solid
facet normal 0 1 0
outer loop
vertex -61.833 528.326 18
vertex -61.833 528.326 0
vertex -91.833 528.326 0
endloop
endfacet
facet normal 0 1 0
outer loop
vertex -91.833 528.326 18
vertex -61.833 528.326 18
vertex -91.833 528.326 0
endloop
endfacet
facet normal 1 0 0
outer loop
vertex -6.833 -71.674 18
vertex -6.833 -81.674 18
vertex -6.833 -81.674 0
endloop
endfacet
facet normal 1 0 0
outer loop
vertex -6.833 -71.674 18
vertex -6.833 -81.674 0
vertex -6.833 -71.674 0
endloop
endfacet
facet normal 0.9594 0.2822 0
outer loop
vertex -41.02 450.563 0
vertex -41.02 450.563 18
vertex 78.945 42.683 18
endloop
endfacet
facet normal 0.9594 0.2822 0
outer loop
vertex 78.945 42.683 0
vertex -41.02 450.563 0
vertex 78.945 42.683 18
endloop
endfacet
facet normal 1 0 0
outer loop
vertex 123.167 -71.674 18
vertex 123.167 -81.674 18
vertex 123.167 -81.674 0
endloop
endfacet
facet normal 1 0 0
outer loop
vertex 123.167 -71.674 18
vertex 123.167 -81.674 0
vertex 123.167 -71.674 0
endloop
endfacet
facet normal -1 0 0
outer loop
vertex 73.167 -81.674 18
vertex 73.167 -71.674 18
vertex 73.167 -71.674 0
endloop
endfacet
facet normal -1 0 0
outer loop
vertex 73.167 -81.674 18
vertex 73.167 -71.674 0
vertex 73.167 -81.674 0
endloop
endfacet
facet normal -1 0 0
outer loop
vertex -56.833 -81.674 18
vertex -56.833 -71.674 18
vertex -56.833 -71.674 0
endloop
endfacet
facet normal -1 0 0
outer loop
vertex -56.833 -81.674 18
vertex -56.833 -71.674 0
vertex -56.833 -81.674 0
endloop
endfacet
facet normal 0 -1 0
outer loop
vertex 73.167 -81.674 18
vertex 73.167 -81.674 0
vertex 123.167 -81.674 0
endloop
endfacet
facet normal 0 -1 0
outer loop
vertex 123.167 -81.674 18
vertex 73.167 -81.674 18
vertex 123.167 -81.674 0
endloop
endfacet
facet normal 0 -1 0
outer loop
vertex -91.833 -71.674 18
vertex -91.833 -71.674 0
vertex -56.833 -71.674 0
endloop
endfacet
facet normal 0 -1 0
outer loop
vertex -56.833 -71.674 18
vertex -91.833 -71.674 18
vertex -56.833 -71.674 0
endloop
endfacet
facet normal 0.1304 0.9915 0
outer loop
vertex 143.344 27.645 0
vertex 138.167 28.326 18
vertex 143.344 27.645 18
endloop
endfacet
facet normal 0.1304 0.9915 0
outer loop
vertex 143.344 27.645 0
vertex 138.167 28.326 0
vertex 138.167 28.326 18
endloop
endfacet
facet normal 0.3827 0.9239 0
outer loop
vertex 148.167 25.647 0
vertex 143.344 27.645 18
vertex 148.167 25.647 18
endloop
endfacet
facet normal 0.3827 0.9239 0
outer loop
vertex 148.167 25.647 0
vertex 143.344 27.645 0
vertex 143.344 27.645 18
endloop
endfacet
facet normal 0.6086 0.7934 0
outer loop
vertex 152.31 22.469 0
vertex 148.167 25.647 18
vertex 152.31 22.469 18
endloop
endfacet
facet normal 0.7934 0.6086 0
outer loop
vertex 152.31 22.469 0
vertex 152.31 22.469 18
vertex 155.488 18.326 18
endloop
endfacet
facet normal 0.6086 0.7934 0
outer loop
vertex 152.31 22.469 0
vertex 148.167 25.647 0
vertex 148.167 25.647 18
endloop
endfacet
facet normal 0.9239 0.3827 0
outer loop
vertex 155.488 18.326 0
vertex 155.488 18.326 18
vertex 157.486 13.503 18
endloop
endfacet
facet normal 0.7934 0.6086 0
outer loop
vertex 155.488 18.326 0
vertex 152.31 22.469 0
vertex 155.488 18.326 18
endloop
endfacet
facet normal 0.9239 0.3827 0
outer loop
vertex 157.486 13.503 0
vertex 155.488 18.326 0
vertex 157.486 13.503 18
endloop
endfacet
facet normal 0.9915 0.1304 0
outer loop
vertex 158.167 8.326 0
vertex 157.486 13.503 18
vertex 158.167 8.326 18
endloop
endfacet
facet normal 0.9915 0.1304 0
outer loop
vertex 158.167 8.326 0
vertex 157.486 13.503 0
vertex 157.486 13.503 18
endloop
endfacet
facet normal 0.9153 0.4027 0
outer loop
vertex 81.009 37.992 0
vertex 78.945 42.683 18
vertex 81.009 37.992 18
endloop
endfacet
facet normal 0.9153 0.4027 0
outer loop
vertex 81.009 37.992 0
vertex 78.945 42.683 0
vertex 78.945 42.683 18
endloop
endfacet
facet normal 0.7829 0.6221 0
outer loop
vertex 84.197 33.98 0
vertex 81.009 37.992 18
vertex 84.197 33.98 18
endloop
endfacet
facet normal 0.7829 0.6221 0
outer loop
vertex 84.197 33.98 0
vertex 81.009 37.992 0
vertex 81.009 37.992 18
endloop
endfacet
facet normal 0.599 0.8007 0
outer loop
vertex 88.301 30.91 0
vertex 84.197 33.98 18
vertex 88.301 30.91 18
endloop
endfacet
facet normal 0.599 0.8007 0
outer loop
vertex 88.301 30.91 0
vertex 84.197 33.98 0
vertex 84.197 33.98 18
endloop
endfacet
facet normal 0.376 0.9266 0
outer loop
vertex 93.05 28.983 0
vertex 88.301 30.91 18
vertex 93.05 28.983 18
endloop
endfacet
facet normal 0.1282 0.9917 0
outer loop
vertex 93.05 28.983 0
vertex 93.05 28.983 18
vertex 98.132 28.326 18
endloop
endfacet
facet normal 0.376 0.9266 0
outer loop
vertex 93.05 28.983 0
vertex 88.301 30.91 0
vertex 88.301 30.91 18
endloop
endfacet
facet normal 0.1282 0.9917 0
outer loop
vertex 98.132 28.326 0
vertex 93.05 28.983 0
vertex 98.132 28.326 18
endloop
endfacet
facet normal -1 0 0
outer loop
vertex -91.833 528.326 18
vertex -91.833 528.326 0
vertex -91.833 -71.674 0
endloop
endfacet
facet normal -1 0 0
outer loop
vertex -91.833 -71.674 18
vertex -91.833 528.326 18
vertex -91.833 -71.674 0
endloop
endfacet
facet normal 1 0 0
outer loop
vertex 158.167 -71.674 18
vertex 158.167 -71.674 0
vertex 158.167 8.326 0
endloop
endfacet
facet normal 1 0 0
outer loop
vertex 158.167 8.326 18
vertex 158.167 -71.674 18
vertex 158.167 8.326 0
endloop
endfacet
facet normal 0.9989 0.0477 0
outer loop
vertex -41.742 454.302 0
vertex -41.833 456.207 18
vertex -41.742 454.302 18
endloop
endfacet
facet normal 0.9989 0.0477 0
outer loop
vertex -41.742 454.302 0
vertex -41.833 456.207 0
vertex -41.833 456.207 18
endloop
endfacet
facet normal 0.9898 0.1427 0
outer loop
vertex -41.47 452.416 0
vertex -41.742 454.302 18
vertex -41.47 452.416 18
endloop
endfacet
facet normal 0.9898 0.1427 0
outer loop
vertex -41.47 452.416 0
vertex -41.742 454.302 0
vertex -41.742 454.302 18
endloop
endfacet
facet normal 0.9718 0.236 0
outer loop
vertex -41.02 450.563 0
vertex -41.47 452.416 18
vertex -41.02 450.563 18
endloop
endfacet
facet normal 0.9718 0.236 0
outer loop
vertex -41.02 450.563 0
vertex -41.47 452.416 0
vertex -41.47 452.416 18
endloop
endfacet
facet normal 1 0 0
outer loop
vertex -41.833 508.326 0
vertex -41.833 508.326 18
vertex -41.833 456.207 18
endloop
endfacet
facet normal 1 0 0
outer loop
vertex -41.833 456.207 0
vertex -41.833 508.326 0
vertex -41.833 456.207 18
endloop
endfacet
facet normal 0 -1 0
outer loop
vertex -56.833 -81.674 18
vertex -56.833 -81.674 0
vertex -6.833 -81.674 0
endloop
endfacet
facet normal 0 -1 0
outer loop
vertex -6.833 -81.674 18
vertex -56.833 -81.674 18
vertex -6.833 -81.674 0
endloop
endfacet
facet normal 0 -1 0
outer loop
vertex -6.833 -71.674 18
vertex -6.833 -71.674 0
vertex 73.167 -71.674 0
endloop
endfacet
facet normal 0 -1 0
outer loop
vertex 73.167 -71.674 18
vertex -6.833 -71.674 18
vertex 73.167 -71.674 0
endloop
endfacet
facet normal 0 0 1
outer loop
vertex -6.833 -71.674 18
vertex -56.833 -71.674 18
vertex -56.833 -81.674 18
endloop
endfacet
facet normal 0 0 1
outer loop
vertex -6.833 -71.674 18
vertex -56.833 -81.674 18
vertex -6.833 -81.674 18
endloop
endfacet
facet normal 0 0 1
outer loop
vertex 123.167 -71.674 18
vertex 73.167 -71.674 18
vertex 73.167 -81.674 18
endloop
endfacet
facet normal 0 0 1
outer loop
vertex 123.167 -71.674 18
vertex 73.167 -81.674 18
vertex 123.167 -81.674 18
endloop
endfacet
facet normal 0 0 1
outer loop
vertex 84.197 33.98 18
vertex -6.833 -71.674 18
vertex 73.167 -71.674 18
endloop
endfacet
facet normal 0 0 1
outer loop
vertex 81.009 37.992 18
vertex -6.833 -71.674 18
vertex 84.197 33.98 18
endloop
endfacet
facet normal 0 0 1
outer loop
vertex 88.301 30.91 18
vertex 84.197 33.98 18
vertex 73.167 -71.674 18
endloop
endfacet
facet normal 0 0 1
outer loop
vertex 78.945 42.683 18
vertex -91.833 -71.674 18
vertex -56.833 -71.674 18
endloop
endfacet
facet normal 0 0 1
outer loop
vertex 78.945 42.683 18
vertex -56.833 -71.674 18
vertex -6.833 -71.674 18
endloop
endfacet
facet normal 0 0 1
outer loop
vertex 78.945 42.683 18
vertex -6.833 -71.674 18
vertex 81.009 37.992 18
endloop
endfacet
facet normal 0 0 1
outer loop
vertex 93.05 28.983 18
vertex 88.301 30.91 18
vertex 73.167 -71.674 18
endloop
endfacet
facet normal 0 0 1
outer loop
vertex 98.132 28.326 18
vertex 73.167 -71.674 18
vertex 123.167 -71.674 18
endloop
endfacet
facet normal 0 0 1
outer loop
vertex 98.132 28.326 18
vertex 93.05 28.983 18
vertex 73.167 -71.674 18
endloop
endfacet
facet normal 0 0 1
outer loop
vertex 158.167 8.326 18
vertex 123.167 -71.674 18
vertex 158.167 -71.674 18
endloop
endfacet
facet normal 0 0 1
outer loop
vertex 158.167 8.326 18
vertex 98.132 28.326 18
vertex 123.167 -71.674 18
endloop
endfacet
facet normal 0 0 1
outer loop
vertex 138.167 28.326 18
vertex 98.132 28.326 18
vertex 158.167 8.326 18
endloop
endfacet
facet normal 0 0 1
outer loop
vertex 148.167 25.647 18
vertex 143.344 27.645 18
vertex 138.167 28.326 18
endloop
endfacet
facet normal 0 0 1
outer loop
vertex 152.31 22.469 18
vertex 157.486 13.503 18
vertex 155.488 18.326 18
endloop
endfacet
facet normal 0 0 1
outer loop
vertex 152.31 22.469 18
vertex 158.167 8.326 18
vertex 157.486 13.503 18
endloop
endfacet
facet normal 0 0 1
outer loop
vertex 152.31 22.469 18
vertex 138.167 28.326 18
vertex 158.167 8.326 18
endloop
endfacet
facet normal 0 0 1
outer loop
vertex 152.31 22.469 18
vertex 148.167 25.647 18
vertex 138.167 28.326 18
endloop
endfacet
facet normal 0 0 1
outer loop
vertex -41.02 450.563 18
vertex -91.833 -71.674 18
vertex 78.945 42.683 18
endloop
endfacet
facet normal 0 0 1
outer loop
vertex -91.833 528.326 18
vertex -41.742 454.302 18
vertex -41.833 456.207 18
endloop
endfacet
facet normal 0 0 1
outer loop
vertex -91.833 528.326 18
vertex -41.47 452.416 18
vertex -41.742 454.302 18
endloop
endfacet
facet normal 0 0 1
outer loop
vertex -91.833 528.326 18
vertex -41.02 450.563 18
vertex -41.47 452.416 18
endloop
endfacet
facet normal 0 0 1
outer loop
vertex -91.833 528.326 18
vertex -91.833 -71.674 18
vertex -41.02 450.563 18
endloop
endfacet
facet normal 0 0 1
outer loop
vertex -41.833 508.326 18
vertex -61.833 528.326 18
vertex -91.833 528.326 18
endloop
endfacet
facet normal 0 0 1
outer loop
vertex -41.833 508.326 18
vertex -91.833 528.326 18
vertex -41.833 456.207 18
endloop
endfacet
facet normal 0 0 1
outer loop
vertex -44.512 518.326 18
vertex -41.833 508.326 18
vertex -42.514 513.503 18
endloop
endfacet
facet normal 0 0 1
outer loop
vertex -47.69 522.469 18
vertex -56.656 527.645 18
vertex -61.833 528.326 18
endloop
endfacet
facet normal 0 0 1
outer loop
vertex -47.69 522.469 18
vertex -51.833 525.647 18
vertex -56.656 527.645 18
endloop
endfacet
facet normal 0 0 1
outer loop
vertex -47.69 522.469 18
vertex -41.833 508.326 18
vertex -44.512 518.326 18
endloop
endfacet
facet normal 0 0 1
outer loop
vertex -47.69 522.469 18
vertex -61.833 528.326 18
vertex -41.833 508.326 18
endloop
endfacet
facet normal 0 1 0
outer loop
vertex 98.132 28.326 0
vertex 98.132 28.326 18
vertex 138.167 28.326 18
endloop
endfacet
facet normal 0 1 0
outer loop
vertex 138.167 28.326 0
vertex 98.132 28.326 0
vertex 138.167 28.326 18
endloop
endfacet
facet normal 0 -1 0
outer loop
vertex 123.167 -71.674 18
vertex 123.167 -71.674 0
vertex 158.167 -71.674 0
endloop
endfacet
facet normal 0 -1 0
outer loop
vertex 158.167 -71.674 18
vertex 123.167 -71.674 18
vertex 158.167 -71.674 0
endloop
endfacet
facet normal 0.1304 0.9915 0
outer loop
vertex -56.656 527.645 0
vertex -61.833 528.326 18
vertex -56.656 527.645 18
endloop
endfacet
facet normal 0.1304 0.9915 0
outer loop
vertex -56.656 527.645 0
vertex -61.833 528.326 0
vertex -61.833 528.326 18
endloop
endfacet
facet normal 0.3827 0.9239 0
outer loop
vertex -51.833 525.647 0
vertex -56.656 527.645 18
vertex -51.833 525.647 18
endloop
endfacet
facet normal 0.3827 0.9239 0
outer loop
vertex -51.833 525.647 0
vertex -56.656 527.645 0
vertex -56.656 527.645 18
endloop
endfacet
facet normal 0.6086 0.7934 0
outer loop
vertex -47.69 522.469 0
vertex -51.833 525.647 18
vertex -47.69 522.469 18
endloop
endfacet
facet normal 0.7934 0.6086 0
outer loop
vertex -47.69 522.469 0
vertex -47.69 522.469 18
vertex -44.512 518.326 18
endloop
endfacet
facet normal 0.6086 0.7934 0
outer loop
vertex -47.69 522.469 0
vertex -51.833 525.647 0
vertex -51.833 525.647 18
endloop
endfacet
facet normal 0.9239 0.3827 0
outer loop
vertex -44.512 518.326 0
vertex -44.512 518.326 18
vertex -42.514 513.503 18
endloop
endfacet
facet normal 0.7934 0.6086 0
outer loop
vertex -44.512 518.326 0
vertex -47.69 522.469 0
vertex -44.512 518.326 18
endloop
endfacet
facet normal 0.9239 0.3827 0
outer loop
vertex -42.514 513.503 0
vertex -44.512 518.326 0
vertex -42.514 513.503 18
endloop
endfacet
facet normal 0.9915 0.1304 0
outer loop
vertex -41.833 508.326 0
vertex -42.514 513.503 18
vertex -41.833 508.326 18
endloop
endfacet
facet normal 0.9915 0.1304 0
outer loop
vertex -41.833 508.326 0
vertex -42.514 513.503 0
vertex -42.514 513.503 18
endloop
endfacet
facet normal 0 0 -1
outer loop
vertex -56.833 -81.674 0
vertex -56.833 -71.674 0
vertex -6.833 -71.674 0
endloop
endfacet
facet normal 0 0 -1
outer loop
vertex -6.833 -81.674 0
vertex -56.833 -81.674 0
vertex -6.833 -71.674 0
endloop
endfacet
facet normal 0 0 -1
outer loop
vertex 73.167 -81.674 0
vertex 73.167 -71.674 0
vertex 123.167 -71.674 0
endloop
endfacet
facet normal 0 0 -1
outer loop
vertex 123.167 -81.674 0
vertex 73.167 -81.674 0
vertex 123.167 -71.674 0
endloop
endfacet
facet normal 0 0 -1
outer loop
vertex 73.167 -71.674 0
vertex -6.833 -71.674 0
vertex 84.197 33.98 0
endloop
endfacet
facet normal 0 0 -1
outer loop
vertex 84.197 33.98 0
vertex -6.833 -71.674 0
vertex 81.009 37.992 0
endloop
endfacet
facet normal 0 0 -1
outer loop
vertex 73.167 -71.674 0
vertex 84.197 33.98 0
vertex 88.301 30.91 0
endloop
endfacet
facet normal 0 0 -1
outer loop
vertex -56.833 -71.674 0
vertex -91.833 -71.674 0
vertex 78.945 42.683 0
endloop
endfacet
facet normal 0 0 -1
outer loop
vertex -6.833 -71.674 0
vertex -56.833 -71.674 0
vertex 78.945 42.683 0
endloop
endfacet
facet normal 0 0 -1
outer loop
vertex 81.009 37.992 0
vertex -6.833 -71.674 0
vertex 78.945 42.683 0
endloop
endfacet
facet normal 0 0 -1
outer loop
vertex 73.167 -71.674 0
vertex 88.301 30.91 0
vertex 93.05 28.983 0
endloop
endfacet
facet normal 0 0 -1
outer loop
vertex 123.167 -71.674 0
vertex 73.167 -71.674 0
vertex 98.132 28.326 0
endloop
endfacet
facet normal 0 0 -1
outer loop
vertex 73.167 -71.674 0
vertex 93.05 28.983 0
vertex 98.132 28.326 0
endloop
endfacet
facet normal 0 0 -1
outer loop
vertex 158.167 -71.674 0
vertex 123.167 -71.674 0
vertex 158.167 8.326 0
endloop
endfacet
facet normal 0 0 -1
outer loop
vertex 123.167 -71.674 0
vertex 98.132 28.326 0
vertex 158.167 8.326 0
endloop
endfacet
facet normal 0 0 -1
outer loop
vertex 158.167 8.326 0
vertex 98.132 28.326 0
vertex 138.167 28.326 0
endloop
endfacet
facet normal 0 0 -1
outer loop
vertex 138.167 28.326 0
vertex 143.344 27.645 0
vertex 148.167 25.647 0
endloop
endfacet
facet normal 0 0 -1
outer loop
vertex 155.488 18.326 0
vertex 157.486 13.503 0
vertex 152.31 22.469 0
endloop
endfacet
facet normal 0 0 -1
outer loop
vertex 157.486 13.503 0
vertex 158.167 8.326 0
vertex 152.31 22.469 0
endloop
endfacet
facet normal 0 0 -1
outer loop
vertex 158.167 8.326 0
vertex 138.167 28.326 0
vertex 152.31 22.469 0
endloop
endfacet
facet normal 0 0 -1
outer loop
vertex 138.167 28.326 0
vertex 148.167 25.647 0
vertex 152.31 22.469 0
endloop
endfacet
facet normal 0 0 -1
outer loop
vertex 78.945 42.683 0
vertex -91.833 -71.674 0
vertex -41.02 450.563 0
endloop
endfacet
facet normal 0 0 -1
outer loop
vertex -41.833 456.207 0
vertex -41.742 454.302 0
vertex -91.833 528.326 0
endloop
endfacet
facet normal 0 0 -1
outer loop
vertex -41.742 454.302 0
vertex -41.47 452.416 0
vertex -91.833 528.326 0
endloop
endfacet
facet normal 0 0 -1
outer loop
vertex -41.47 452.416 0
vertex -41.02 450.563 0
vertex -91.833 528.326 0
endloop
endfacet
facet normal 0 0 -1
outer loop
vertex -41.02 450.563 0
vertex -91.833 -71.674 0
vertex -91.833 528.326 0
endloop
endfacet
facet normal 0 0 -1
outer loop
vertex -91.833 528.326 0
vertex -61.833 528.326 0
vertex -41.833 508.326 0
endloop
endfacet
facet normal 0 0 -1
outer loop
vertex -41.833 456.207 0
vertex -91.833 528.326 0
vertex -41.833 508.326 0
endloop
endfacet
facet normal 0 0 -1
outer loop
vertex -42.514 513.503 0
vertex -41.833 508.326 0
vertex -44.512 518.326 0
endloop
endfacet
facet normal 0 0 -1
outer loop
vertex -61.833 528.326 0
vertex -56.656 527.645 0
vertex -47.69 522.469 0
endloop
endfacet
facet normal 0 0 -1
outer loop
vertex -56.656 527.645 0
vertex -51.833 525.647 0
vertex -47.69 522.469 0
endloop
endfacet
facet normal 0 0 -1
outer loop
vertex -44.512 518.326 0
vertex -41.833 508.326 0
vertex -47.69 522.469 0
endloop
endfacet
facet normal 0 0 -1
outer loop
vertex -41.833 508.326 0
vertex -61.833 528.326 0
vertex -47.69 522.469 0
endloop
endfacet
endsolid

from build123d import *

# Parameters (mm, degrees)
F1_DEPTH = 18
F3_DEPTH = 25
F4_R     = 20


with BuildPart() as f1:
    # F0 (on Top) → F1 (new body)
    with BuildSketch(Plane.XY):
        Polygon((158.1674836576, 528.3263906837), (-91.8325163424, 528.3263906837), (-91.8325163424, -71.6736093163), (-56.8325163424, -71.6736093163), (-56.8325163424, -81.6736093163), (-6.8325163424, -81.6736093163), (-6.8325163424, -71.6736093163), (73.1674836576, -71.6736093163), (73.1674836576, -81.6736093163), (123.1674836576, -81.6736093163), (123.1674836576, -71.6736093163), (158.1674836576, -71.6736093163), align=None)
    extrude(amount=F1_DEPTH)

    # F2 (on face) → F3 (cut)
    with BuildSketch(Plane.XY.offset(18)):
        Polygon((158.1674836576, 528.3263906837), (-41.8325163424, 528.3263906837), (-41.8325163424, 453.3263906837), (83.1674836576, 28.3263906837), (158.1674836576, 28.3263906837), align=None)
    extrude(amount=-F3_DEPTH, mode=Mode.SUBTRACT)

    # F4
    f4_edges = [f1.edges().sort_by_distance(p)[0] for p in [
        (-41.832516, 528.326391, 9),
        (158.167484, 28.326391, 9),
        (-41.832516, 453.326391, 9),
        (83.167484, 28.326391, 9),
    ]]
    fillet(f4_edges, radius=F4_R)


solid = f1.part
